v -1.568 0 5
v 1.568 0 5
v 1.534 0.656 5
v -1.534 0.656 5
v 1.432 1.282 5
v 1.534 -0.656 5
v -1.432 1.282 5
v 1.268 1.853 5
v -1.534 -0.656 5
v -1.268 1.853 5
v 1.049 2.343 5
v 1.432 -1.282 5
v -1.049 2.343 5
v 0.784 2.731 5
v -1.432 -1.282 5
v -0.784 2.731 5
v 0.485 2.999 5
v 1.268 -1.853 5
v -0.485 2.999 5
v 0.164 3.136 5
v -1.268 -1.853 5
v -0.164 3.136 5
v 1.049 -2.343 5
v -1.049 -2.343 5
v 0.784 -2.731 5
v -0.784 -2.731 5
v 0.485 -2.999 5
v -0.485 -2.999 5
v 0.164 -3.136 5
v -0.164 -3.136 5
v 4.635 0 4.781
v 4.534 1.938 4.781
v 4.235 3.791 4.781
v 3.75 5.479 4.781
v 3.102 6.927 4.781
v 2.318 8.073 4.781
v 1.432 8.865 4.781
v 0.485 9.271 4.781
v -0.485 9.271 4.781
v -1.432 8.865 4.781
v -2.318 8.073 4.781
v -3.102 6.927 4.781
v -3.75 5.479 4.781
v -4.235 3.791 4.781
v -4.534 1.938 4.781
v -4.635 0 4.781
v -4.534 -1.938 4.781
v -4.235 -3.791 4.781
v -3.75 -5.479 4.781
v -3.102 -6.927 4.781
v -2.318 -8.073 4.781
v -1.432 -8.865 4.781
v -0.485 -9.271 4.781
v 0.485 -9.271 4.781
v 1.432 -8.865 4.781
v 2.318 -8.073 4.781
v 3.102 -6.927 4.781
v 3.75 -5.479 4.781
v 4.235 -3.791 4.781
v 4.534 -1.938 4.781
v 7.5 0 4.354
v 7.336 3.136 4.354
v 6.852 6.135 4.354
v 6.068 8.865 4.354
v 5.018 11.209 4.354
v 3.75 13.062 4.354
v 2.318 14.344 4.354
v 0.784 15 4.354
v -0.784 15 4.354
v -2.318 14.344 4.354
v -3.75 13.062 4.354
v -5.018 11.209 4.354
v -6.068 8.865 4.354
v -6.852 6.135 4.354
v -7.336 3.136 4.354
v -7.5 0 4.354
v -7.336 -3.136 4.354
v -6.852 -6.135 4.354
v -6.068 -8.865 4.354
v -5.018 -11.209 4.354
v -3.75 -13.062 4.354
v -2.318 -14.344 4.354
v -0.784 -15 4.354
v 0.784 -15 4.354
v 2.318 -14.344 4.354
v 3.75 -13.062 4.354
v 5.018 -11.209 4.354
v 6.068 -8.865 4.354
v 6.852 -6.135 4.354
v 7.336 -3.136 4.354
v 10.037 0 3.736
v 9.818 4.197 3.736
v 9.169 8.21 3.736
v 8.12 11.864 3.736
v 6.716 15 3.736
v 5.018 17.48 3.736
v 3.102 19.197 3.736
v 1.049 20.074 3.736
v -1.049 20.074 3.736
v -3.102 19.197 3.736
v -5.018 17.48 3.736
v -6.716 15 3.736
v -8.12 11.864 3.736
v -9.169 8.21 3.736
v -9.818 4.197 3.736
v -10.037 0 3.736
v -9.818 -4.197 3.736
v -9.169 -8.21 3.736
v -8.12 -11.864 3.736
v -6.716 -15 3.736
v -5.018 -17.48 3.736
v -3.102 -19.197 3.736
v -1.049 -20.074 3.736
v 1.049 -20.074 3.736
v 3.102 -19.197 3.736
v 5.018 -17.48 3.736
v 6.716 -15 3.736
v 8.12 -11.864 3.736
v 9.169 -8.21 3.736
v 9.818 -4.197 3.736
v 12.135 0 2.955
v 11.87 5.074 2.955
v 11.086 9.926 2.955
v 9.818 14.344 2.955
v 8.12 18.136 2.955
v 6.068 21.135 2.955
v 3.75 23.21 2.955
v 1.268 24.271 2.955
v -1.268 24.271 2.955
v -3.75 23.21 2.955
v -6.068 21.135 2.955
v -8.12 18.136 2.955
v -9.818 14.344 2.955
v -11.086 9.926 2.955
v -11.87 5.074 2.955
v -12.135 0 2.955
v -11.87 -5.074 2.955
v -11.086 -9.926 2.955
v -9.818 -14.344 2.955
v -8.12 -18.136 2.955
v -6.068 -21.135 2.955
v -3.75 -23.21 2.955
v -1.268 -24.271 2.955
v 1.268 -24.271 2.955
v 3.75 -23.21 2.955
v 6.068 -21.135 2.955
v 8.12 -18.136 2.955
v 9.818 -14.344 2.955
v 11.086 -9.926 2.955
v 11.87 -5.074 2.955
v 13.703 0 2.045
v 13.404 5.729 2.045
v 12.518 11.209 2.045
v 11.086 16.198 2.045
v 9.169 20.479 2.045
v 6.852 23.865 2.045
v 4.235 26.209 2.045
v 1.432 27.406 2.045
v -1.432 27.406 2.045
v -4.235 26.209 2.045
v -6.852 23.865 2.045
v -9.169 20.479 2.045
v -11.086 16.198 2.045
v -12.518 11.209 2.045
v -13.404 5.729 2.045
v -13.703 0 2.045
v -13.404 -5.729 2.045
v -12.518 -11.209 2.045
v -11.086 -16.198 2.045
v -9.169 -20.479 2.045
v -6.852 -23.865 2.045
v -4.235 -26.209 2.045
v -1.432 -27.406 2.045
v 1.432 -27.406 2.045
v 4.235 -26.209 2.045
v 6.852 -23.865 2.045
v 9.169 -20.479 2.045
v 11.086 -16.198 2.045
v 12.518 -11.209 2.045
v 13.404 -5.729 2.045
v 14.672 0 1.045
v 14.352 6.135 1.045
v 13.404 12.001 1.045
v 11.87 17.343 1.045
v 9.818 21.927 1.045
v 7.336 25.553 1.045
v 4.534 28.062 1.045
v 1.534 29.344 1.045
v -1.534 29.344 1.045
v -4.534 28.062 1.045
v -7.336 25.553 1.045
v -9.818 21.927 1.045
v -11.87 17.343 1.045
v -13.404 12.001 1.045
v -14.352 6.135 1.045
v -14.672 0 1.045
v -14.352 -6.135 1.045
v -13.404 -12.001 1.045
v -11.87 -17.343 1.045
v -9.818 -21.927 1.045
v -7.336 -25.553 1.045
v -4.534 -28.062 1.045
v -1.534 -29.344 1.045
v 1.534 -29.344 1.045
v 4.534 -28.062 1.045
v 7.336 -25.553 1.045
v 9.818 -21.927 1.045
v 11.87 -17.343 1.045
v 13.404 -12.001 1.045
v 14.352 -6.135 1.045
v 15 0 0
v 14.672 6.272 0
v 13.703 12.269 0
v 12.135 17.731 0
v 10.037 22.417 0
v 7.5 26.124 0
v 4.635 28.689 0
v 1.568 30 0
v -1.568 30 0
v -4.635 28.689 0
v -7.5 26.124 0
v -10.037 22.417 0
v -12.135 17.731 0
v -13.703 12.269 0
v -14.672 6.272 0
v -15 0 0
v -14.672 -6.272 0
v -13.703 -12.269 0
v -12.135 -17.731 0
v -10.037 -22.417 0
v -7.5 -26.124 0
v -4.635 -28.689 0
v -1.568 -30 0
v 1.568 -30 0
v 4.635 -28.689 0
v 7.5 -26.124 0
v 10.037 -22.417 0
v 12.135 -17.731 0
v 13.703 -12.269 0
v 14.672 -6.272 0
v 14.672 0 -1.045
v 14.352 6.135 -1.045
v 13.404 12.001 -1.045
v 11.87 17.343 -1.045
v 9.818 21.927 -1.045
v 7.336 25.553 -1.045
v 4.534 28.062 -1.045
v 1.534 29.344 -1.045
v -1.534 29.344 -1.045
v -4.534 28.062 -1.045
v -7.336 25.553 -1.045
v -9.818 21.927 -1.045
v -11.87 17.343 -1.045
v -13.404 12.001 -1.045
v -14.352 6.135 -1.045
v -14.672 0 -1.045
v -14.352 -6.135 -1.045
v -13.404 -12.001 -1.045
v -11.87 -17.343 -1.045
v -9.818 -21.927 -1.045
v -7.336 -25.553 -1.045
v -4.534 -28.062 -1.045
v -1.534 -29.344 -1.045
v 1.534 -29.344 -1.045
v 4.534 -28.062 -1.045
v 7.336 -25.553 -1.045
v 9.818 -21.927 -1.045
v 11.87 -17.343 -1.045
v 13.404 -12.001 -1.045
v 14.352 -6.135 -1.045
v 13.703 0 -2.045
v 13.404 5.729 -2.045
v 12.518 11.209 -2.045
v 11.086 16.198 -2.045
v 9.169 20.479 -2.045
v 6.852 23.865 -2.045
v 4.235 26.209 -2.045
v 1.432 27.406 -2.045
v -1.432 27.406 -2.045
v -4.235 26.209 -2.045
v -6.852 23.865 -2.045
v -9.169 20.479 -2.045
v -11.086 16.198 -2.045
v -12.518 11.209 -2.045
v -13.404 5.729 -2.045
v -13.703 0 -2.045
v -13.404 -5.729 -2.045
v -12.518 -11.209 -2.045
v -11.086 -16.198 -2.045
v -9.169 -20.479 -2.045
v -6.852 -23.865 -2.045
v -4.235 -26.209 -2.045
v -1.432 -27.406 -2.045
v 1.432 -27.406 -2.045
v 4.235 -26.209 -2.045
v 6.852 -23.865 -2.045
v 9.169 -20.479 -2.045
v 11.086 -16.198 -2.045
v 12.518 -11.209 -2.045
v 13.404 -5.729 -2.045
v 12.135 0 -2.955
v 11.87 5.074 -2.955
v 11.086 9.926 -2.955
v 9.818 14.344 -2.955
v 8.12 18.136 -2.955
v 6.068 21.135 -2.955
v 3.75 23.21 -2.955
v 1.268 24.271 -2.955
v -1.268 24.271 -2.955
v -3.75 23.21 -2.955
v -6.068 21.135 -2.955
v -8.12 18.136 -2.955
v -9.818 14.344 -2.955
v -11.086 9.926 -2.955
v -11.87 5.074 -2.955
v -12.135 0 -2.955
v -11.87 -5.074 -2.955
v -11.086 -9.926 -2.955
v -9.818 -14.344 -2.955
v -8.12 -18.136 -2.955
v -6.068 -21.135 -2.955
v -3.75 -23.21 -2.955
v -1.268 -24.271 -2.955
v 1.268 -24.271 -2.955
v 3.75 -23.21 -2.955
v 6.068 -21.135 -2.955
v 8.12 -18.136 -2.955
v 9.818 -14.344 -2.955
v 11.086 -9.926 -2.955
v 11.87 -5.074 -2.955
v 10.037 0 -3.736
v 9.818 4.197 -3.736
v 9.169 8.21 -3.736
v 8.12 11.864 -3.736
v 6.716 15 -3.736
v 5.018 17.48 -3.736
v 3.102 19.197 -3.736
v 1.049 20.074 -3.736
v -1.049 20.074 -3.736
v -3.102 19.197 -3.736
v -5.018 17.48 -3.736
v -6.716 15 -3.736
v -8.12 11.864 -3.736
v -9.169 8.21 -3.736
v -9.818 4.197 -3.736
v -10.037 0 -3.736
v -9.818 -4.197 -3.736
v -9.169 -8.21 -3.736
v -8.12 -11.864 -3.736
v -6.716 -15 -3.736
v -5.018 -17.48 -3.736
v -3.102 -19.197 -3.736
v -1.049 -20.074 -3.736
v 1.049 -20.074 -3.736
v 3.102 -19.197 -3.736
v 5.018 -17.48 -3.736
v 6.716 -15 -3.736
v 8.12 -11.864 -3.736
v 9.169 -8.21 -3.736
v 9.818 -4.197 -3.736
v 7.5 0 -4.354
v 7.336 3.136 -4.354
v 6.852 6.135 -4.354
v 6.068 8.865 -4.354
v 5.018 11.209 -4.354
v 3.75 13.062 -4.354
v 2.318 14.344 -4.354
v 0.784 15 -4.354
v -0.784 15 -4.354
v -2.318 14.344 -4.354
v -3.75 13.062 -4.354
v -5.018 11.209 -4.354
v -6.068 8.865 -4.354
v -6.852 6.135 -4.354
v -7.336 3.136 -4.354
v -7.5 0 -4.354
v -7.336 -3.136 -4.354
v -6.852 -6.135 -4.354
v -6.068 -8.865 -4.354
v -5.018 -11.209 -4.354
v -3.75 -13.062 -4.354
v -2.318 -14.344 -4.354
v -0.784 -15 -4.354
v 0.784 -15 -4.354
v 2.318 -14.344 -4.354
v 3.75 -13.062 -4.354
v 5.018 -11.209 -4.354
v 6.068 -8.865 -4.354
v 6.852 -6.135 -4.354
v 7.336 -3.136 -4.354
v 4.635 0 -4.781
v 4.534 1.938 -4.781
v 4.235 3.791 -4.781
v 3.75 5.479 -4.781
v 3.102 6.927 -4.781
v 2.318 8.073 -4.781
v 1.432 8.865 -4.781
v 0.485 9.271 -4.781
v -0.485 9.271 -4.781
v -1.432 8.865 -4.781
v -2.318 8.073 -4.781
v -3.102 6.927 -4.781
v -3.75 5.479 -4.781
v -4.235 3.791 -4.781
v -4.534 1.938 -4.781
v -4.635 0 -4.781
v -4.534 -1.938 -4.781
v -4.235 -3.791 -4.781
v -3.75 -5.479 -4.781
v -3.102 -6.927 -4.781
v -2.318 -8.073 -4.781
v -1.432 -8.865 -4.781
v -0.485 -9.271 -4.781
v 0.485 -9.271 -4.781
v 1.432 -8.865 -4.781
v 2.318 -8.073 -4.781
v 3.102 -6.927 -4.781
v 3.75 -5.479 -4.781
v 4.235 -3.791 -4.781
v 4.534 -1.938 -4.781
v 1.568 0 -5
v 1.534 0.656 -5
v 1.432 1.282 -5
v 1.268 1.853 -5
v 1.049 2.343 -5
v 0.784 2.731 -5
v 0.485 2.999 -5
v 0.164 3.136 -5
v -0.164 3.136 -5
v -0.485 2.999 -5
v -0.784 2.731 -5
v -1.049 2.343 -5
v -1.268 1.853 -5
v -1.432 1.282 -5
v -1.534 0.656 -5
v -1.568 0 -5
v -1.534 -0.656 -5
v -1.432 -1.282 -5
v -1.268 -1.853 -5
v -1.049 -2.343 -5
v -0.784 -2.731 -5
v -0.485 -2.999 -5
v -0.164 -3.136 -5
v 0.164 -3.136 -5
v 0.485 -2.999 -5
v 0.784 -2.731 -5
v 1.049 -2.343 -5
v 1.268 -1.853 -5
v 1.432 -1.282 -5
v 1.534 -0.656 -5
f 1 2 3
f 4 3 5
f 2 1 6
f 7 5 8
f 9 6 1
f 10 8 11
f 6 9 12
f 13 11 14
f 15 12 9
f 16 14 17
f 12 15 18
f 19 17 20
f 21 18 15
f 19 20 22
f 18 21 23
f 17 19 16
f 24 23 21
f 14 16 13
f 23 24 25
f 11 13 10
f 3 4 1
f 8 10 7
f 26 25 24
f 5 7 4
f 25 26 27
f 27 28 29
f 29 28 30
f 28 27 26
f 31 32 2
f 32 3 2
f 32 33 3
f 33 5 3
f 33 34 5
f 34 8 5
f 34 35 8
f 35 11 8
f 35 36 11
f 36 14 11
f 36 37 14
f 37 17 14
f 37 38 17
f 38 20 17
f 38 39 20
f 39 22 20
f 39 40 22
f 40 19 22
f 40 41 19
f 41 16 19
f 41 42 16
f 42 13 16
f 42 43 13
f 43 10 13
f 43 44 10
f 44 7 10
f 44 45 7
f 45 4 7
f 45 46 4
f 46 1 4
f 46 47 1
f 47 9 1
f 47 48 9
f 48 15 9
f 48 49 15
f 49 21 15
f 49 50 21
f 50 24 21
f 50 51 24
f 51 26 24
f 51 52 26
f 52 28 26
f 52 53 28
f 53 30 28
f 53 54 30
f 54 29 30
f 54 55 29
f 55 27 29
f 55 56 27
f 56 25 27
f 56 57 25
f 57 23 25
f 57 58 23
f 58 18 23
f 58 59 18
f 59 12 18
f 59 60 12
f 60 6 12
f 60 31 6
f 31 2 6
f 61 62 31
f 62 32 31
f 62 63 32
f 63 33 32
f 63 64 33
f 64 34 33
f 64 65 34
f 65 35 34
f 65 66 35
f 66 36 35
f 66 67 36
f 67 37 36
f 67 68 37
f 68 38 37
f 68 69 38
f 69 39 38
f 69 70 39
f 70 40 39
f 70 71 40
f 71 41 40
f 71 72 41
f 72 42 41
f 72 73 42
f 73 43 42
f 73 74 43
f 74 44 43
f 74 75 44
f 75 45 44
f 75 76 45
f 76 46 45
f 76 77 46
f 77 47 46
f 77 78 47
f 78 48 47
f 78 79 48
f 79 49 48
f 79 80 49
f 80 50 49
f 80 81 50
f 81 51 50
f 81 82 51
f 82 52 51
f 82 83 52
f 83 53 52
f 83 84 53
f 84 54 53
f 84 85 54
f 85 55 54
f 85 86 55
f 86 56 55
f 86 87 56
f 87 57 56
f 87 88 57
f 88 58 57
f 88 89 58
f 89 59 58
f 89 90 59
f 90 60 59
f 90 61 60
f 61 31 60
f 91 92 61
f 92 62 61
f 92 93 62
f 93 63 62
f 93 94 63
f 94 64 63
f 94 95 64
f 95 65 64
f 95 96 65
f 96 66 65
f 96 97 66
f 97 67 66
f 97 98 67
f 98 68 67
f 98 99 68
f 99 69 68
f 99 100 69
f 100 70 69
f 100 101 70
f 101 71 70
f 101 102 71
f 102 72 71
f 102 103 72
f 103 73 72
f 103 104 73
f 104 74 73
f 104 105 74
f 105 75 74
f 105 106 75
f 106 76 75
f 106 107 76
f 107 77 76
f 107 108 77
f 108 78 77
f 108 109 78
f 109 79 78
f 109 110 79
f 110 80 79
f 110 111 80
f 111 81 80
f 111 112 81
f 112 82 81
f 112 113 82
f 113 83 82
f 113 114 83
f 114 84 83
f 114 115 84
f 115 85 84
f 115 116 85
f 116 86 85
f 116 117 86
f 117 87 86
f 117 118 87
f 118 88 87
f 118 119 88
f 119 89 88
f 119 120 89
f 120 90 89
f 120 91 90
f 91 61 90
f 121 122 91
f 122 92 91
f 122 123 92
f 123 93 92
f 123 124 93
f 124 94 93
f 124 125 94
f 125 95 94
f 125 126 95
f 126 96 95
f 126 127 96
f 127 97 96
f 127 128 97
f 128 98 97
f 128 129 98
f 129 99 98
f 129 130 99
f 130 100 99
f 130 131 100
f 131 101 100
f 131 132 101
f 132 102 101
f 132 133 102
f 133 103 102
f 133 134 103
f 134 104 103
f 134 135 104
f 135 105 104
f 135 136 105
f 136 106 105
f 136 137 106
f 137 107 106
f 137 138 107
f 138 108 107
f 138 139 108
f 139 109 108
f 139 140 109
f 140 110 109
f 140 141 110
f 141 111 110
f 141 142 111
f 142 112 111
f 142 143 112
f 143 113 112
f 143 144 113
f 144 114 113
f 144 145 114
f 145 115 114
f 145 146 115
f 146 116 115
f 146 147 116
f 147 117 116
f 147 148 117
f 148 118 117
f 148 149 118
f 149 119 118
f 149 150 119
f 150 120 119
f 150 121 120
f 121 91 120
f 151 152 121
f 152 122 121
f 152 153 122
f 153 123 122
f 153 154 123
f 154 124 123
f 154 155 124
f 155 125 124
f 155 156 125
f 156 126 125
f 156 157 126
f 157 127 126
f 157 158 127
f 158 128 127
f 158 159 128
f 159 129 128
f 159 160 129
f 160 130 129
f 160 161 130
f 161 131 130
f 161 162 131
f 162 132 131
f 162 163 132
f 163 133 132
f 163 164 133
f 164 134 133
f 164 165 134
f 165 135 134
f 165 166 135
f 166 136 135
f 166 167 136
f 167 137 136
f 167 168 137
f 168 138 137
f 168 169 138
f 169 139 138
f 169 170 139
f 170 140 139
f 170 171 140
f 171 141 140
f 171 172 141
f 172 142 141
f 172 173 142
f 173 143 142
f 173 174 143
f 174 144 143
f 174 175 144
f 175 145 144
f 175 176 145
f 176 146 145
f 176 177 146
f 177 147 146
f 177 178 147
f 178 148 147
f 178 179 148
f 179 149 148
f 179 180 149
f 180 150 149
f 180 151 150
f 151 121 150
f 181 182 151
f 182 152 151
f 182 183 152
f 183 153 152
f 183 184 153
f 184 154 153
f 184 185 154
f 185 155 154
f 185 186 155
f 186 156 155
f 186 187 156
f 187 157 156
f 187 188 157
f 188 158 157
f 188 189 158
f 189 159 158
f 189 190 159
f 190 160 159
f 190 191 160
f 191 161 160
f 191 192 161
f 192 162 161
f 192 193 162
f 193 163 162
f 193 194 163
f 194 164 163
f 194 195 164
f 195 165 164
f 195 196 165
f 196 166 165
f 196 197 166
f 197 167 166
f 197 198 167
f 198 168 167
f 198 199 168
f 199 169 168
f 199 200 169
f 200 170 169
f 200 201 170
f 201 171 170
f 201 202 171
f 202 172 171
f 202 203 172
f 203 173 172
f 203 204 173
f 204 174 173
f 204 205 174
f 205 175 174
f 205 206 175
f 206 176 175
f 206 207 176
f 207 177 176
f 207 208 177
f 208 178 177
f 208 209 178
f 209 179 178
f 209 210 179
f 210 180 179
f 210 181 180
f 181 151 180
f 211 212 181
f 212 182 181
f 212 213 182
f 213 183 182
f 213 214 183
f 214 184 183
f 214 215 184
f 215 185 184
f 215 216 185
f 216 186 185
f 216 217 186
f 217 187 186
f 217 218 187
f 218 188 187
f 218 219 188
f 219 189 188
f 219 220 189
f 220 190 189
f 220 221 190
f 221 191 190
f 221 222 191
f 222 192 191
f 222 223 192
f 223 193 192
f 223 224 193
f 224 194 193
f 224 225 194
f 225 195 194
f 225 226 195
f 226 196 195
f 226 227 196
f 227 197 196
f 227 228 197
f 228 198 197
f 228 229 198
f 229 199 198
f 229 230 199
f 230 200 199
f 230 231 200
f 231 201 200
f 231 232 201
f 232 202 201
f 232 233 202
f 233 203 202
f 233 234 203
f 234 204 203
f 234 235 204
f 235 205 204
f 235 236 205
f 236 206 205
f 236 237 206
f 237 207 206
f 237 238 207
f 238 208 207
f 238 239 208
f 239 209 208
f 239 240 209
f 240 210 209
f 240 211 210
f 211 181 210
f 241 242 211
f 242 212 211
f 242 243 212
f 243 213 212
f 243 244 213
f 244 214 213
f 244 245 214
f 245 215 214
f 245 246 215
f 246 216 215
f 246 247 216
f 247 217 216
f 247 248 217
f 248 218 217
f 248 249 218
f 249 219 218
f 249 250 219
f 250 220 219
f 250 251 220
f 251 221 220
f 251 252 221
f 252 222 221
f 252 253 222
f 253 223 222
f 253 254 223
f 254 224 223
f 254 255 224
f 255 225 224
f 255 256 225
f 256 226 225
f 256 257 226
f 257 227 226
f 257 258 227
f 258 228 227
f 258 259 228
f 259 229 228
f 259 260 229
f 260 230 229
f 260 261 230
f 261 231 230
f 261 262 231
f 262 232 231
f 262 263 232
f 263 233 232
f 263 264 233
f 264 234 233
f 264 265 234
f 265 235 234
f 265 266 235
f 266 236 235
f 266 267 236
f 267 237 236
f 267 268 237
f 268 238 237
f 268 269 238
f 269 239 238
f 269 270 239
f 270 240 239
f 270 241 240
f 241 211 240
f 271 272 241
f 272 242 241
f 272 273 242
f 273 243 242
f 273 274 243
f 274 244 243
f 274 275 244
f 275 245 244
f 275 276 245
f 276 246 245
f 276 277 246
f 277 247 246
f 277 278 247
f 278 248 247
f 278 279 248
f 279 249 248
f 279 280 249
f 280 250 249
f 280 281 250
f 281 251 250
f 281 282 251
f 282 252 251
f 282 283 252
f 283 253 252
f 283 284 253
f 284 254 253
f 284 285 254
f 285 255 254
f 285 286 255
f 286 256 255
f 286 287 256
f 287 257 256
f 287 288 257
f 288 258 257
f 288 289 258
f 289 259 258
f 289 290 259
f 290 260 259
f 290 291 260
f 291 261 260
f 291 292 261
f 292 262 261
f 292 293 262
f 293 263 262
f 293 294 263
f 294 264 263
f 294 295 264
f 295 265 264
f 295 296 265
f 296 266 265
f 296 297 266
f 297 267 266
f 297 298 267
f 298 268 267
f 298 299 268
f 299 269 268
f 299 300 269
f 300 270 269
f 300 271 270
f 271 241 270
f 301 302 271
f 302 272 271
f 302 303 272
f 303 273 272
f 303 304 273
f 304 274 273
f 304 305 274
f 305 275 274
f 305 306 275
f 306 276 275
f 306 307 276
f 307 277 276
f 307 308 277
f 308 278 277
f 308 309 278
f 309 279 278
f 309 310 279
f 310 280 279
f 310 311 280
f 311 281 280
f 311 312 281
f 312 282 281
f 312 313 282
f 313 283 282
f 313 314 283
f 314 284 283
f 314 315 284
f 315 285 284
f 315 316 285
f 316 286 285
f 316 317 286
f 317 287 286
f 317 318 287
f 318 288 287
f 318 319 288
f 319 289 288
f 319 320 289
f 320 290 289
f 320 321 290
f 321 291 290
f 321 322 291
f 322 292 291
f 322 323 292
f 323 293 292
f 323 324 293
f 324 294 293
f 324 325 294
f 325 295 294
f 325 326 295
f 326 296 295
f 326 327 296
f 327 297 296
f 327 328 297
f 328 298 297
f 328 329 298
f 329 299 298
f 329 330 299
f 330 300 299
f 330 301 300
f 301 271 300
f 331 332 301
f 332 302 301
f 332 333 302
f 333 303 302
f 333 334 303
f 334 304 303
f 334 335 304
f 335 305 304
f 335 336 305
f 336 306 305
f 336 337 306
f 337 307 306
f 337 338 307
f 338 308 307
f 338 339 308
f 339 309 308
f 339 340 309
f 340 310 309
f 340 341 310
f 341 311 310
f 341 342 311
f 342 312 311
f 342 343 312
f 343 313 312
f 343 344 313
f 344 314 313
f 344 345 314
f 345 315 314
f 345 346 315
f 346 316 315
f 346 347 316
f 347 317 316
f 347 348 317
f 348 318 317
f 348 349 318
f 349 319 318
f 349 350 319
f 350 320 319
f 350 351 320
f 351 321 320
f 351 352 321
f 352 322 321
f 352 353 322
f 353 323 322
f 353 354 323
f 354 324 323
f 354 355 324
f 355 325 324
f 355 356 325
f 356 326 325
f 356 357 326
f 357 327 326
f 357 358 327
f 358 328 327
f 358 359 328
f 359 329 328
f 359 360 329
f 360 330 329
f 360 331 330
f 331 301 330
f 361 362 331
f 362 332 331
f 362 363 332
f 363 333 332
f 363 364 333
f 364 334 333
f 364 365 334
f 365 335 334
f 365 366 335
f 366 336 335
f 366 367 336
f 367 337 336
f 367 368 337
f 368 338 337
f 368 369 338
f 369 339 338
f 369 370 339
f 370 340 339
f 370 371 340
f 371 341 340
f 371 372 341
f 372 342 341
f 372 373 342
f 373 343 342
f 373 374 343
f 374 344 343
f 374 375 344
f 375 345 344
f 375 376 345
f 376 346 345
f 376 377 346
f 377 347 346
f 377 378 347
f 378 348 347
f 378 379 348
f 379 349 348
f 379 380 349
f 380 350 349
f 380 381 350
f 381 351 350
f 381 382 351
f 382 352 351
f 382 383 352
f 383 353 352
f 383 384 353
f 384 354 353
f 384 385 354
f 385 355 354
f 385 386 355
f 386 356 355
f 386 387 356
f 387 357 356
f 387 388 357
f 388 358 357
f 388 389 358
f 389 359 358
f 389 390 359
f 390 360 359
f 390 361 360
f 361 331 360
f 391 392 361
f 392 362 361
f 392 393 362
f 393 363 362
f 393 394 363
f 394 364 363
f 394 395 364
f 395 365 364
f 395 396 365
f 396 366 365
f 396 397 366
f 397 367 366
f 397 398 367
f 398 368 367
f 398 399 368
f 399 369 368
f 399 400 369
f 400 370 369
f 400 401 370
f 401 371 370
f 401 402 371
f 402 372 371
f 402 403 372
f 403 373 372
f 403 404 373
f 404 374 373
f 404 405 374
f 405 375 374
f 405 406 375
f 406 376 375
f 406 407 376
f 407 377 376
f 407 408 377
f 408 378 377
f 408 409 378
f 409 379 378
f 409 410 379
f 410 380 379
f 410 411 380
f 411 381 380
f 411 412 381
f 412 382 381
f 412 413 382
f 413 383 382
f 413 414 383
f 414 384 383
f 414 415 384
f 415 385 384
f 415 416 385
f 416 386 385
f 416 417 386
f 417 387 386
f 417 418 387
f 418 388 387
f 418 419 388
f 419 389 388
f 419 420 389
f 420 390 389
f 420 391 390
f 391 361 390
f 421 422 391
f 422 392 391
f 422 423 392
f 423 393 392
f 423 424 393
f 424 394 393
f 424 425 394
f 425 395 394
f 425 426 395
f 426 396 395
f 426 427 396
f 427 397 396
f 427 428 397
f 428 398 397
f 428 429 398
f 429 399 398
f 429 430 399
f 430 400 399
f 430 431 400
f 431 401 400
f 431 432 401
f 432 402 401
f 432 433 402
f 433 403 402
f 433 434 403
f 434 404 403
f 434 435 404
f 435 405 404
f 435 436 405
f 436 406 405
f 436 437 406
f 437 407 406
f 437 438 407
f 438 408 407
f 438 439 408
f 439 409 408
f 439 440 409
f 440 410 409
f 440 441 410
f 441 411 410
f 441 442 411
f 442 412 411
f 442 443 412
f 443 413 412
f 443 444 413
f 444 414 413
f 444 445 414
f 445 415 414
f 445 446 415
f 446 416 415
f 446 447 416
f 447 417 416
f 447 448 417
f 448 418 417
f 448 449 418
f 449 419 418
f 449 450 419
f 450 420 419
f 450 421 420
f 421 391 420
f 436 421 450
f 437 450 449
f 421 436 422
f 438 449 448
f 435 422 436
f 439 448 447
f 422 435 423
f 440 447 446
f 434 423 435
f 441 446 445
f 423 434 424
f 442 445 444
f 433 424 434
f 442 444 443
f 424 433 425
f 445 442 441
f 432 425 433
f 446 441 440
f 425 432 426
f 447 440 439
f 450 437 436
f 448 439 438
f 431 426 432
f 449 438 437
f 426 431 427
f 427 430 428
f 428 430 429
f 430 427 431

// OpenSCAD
// Unit of length: Unit.MM
resize(newsize = [30.0, 60.0, 10.0], auto = [false, false, false])
{
   sphere(r = 10.0);
}
